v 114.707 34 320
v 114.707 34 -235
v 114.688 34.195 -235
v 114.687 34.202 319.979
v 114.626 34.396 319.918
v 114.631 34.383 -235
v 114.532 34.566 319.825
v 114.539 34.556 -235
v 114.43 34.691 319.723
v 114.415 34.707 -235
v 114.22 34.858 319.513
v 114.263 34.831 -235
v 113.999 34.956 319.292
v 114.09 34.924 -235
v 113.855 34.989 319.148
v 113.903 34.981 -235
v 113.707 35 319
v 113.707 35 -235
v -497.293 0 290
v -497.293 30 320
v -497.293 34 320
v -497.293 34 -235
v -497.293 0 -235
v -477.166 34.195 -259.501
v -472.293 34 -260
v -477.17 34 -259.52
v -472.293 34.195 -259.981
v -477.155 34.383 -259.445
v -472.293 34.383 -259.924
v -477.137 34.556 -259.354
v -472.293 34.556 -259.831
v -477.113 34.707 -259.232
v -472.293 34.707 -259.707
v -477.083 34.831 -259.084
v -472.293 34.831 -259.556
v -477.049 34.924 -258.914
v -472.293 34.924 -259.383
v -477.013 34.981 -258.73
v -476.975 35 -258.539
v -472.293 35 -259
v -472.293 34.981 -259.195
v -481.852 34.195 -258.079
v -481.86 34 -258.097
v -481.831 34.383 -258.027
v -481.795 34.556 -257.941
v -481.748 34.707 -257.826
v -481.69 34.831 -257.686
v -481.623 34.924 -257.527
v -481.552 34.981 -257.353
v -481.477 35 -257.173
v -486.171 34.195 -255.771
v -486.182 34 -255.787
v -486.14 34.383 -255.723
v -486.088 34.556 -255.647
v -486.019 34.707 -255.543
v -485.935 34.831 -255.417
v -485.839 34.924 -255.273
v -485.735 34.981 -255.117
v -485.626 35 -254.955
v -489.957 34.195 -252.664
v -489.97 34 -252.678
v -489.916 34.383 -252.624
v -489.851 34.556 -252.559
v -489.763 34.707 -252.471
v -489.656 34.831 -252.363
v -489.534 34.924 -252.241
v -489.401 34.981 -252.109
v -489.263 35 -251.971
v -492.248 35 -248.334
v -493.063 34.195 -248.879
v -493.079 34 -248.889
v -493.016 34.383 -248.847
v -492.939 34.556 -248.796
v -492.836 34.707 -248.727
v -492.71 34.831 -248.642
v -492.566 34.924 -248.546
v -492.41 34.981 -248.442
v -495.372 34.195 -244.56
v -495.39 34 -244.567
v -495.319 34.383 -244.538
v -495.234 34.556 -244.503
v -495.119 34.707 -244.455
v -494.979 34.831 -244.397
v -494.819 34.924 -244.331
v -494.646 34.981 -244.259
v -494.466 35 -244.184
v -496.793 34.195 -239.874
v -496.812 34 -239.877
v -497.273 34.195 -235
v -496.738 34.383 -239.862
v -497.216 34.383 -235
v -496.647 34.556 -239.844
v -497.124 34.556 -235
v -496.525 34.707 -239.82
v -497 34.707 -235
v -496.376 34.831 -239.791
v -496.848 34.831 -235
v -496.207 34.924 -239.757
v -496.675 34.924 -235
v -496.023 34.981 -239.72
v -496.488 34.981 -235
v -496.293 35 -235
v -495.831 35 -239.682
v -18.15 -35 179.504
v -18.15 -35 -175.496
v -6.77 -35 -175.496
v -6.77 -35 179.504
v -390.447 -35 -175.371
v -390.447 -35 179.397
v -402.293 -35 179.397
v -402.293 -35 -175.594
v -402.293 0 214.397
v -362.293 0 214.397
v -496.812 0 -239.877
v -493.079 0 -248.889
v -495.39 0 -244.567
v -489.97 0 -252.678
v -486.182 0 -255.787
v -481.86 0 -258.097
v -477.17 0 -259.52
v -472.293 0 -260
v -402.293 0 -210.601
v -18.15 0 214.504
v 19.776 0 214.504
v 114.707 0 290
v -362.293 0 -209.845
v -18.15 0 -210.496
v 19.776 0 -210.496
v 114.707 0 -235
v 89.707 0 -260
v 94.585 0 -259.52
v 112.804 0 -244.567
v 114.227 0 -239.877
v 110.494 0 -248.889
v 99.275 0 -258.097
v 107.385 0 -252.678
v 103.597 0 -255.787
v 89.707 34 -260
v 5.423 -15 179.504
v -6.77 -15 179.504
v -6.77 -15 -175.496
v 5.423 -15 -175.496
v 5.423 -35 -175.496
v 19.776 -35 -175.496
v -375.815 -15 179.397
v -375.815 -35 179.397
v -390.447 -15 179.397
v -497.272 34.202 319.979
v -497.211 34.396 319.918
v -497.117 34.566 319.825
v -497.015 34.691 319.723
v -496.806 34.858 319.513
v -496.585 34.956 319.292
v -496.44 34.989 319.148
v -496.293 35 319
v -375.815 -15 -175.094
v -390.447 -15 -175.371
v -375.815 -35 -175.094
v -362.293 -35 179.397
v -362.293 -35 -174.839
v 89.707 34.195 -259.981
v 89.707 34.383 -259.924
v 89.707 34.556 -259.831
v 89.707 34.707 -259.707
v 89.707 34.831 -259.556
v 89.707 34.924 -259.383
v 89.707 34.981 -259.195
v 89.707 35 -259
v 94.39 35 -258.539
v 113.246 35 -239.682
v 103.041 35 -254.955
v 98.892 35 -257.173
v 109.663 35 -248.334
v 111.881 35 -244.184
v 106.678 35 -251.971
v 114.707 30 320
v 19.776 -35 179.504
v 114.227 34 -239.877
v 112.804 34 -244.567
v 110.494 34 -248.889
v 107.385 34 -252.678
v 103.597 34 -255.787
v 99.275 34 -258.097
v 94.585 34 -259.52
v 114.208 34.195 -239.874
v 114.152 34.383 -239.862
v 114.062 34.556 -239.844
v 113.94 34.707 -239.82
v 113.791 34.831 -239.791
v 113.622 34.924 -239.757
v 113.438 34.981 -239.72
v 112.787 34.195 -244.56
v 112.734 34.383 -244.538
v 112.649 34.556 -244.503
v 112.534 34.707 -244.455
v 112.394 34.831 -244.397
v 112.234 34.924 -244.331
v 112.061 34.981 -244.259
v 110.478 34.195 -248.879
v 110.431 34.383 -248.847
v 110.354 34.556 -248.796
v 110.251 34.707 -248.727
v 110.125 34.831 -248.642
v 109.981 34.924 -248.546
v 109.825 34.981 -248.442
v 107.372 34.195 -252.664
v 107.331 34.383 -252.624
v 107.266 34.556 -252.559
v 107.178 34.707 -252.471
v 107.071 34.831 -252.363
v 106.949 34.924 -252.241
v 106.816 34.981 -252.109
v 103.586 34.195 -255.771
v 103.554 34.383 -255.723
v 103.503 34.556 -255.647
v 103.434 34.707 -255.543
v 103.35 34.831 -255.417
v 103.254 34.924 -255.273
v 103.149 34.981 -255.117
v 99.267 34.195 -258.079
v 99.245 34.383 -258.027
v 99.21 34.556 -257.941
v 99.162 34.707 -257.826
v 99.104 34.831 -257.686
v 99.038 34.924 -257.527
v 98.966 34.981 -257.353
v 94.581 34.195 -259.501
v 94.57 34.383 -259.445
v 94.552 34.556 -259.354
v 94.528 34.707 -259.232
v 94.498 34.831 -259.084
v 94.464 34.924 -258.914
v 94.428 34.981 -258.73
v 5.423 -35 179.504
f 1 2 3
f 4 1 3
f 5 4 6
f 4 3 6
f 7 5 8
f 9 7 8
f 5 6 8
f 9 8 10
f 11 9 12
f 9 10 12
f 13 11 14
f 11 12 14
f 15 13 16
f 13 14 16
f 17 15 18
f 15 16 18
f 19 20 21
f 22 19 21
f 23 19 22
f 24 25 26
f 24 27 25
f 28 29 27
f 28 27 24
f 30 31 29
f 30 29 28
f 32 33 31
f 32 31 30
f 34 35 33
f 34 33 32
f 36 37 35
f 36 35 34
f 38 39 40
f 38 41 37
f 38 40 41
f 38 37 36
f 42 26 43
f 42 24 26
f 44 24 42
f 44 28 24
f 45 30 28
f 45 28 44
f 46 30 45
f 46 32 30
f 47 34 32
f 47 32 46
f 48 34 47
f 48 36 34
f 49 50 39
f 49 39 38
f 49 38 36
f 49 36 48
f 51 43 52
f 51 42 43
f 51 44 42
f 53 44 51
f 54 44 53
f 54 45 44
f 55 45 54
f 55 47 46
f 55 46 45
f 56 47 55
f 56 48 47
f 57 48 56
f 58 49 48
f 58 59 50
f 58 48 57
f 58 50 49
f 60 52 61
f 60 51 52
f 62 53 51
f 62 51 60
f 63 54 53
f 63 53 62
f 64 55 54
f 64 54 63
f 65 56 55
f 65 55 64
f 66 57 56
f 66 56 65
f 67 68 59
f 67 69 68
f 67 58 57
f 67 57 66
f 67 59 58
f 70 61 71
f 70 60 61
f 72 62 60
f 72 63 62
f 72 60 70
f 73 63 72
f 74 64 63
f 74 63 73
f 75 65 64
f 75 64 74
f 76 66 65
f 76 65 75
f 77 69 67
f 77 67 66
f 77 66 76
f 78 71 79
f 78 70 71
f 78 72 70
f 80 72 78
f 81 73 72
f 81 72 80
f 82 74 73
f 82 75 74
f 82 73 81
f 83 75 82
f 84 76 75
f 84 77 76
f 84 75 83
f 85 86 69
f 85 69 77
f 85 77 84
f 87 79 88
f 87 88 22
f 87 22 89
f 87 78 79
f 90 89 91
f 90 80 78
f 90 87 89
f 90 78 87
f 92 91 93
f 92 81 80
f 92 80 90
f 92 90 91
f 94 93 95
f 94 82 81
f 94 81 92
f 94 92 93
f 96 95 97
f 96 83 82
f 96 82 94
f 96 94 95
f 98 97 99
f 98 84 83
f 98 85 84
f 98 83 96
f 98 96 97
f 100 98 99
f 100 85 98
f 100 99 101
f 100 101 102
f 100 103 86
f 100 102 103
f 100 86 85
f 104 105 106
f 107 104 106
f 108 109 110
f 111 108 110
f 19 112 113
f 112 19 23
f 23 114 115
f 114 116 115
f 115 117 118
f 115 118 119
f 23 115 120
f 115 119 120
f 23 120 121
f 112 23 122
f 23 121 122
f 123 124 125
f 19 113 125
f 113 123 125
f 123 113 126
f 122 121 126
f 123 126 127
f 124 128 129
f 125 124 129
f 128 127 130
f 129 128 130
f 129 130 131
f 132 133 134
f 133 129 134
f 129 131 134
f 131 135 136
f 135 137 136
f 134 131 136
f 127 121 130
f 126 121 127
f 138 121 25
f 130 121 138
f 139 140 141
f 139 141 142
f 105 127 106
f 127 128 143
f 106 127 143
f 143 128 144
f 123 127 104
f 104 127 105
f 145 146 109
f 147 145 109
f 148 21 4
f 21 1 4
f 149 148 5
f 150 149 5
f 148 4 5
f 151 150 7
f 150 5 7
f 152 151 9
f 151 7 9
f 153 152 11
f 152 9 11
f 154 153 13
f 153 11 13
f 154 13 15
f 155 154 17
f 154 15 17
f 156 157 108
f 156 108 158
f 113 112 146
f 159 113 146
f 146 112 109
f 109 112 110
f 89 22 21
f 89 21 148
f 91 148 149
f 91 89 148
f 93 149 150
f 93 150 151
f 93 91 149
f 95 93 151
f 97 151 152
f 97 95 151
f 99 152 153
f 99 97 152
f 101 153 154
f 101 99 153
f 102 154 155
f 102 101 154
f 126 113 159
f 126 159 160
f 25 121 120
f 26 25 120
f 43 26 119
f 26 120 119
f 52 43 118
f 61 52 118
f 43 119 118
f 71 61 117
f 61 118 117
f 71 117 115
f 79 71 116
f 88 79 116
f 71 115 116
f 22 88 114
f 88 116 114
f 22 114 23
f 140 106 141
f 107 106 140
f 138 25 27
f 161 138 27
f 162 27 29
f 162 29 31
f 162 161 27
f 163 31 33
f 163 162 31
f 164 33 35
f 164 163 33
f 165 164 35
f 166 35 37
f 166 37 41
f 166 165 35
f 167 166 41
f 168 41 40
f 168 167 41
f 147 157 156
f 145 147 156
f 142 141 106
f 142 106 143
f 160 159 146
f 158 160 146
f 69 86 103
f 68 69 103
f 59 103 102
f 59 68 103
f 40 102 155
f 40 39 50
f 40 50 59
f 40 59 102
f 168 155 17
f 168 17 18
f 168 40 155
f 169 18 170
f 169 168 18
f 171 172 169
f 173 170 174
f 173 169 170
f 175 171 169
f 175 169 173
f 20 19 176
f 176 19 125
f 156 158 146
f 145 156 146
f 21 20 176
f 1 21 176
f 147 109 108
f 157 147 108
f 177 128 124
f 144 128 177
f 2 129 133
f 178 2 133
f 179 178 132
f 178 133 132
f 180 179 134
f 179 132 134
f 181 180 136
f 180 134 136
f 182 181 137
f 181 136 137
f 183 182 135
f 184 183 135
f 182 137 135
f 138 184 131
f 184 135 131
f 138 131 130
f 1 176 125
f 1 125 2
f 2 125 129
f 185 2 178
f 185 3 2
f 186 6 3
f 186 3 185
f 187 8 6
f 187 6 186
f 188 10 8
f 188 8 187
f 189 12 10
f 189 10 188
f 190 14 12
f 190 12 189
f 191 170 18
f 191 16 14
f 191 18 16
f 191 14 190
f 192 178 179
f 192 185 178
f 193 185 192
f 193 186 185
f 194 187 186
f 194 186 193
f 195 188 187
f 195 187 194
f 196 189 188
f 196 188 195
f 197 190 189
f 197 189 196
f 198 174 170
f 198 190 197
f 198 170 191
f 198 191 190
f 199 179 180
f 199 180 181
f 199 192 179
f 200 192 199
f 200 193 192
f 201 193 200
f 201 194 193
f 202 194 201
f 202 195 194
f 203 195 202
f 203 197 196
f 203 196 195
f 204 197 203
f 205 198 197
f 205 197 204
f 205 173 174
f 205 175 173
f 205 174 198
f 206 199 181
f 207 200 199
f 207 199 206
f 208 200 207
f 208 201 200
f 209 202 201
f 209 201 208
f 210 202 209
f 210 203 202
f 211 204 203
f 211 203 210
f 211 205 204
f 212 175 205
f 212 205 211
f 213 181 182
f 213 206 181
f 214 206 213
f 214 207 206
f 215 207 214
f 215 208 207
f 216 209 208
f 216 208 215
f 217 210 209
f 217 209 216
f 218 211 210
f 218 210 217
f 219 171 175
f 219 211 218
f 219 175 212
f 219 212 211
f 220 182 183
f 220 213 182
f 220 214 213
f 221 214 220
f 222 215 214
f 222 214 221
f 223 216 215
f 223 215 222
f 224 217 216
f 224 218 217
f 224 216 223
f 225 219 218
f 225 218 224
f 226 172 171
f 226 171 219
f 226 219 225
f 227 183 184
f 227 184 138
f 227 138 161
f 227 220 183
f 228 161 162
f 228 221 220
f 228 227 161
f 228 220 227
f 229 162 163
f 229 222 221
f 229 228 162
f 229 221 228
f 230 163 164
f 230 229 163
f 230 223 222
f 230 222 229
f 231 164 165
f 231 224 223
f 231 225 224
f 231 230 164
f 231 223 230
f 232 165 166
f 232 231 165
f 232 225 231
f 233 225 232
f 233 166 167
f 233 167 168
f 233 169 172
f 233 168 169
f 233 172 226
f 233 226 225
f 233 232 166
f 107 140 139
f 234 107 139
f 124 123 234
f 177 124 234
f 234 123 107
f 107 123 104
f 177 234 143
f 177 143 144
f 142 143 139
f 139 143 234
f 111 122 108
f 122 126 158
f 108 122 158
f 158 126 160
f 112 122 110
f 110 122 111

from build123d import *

# Parameters (mm, degrees)
SKETCH1_W           = 612
SKETCH1_H           = 580
BOSS_EXTRUDE1_DEPTH = 35
FILLET9_R           = 1
CHAMFER1_SIZE       = 30
FILLET10_R          = 25
SKETCH3_W           = 37.926087763
SKETCH3_H           = 455
BOSS_EXTRUDE2_DEPTH = 35
CHAMFER2_SIZE       = 50
SKETCH4_W           = 12.193127302
SKETCH4_H           = 355
CUT_EXTRUDE1_DEPTH  = 20


with BuildPart() as part:
    # Sketch1 → Boss-Extrude1 (new body)
    with BuildSketch(Plane(origin=(0, 0, 0), x_dir=(1, 0, 0), z_dir=(0, 1, 0))):
        with Locations((-191.292576419, -30)):
            Rectangle(SKETCH1_W, SKETCH1_H)
    extrude(amount=BOSS_EXTRUDE1_DEPTH)

    # Fillet9
    fillet9_edges = [part.edges().sort_by_distance(p)[0] for p in [
        (114.707423581, 35, 30),
        (-191.292576419, 35, -260),
        (-497.292576419, 35, 30),
        (-191.292576419, 35, 320),
    ]]
    fillet(fillet9_edges, radius=FILLET9_R)

    # Chamfer1
    chamfer1_edges = [part.edges().sort_by_distance(p)[0] for p in [
        (-191.292576419, 0, 320),
    ]]
    chamfer(chamfer1_edges, length=CHAMFER1_SIZE)

    # Fillet10
    # the kernel refuses this fillet: 25 mm, written as the material it takes off along each edge
    with BuildSketch(Plane(origin=(89.707423581, 35, -235), x_dir=(1, 0, 0), z_dir=(0, 0, 1))) as fillet10_piece_1:
        with BuildLine():
            CenterArc((24, -1), 1, 0, 90)
            Line((25, -1), (25, 0))
            Line((25, 0), (24, 0))
        make_face()
    revolve(axis=Axis((89.707423581, 35, -235), (0, 1, 0)), revolution_arc=90, mode=Mode.SUBTRACT)
    with BuildSketch(Plane(origin=(-472.292576419, 35, -235), x_dir=(0, 0, -1), z_dir=(1, 0, 0))) as fillet10_piece_2:
        with BuildLine():
            CenterArc((24, -1), 1, 0, 90)
            Line((25, -1), (25, 0))
            Line((25, 0), (24, 0))
        make_face()
    revolve(axis=Axis((-472.292576419, 35, -235), (0, 1, 0)), revolution_arc=90, mode=Mode.SUBTRACT)
    with BuildSketch(Plane(origin=(-497.292576419, -62.5, -260), x_dir=(0, 0, 1), z_dir=(0, 1, 0))) as fillet10_piece_3:
        with BuildLine():
            CenterArc((FILLET10_R, FILLET10_R), FILLET10_R, 180, 90)
            Line((0, FILLET10_R), (0, 0))
            Line((0, 0), (FILLET10_R, 0))
        make_face()
    extrude(amount=97.5, mode=Mode.SUBTRACT)
    with BuildSketch(Plane(origin=(114.707423581, -62.5, -260), x_dir=(0, 0, 1), z_dir=(0, 1, 0))) as fillet10_piece_4:
        with BuildLine():
            CenterArc((FILLET10_R, -FILLET10_R), FILLET10_R, 90, 90)
            Line((0, -FILLET10_R), (0, 0))
            Line((0, 0), (FILLET10_R, 0))
        make_face()
    extrude(amount=97.5, mode=Mode.SUBTRACT)

    # Sketch3 → Boss-Extrude2 (add)
    with BuildSketch(Plane.XZ):
        with Locations((0.812875154, 2.003525588)):
            Rectangle(SKETCH3_W, SKETCH3_H)
        Polygon((-362.292576419, -224.84785724), (-402.292576419, -225.603407802), (-402.292576419, 229.396592198), (-362.292576419, 229.396592198), align=None)
    extrude(amount=BOSS_EXTRUDE2_DEPTH)

    # Chamfer2
    # the kernel refuses this chamfer: 50 mm, written as the material it takes off along each edge
    with BuildSketch(Plane(origin=(148.360068433, -35, -225.496474412), x_dir=(0, 0.9996219169112966, -0.027495876610586594), z_dir=(-1, 0, 0))) as chamfer2_piece_1_section:
        Polygon((CHAMFER2_SIZE * 0.999621916911, -CHAMFER2_SIZE * 0.0274958766106), (-CHAMFER2_SIZE * 0.0274958766106, -CHAMFER2_SIZE * 0.999621916911), (0, 0), align=None)
    chamfer2_piece_1 = extrude(amount=295.09438656, mode=Mode.PRIVATE)
    chamfer2_piece_1 = split(chamfer2_piece_1, bisect_by=Plane(origin=(0.812875153, 0, -207.548086942), z_dir=(0, -1, 0)), keep=Keep.TOP, mode=Mode.PRIVATE)
    add(chamfer2_piece_1, mode=Mode.SUBTRACT)
    with BuildSketch(Plane(origin=(-233.731359359, -35, -222.419494743), x_dir=(0.0005192705001048889, 0.9996219169112966, -0.027490972858964104), z_dir=(-0.999821655017895, 0, -0.018885395343422682))) as chamfer2_piece_2_section:
        Polygon((CHAMFER2_SIZE * 0.999621916911, -CHAMFER2_SIZE * 0.0274958766106), (-CHAMFER2_SIZE * 0.0274958766106, -CHAMFER2_SIZE * 0.999621916911), (0, 0), align=None)
    chamfer2_piece_2 = extrude(amount=297.175433868, mode=Mode.PRIVATE)
    chamfer2_piece_2 = split(chamfer2_piece_2, bisect_by=Plane(origin=(-382.631538812, 0, -207.280446055), z_dir=(0, -1, 0)), keep=Keep.TOP, mode=Mode.PRIVATE)
    add(chamfer2_piece_2, mode=Mode.SUBTRACT)
    with BuildSketch(Plane(origin=(-530.876725818, -35, 229.396592198), x_dir=(0, 0.9996219169112966, 0.027495876610586594), z_dir=(1, 0, 0))) as chamfer2_piece_3_section:
        Polygon((CHAMFER2_SIZE * 0.999621916911, -CHAMFER2_SIZE * 0.0274958766106), (-CHAMFER2_SIZE * 0.0274958766106, -CHAMFER2_SIZE * 0.999621916911), (0, 0), align=None)
    chamfer2_piece_3 = extrude(amount=297.168298797, mode=Mode.PRIVATE)
    chamfer2_piece_3 = split(chamfer2_piece_3, bisect_by=Plane(origin=(-382.292576419, 0, 211.448204728), z_dir=(0, -1, 0)), keep=Keep.TOP, mode=Mode.PRIVATE)
    add(chamfer2_piece_3, mode=Mode.SUBTRACT)
    with BuildSketch(Plane(origin=(-146.734318126, -35, 229.503525588), x_dir=(0, 0.9996219169112966, 0.027495876610586594), z_dir=(1, 0, 0))) as chamfer2_piece_4_section:
        Polygon((CHAMFER2_SIZE * 0.999621916911, -CHAMFER2_SIZE * 0.0274958766106), (-CHAMFER2_SIZE * 0.0274958766106, -CHAMFER2_SIZE * 0.999621916911), (0, 0), align=None)
    chamfer2_piece_4 = extrude(amount=295.09438656, mode=Mode.PRIVATE)
    chamfer2_piece_4 = split(chamfer2_piece_4, bisect_by=Plane(origin=(0.812875153, 0, 211.555138118), z_dir=(0, -1, 0)), keep=Keep.TOP, mode=Mode.PRIVATE)
    add(chamfer2_piece_4, mode=Mode.SUBTRACT)

    # Sketch4 → Cut-Extrude1 (cut)
    with BuildSketch(Plane.XZ.offset(35)):
        with Locations((-0.673352928, 2.003525588)):
            Rectangle(SKETCH4_W, SKETCH4_H)
        Polygon((-390.446989022, 179.396592198), (-390.446989022, -175.370740457), (-375.815236259, -175.094364731), (-375.815236259, 179.396592198), align=None)
    extrude(amount=-CUT_EXTRUDE1_DEPTH, mode=Mode.SUBTRACT)


solid = part.part
